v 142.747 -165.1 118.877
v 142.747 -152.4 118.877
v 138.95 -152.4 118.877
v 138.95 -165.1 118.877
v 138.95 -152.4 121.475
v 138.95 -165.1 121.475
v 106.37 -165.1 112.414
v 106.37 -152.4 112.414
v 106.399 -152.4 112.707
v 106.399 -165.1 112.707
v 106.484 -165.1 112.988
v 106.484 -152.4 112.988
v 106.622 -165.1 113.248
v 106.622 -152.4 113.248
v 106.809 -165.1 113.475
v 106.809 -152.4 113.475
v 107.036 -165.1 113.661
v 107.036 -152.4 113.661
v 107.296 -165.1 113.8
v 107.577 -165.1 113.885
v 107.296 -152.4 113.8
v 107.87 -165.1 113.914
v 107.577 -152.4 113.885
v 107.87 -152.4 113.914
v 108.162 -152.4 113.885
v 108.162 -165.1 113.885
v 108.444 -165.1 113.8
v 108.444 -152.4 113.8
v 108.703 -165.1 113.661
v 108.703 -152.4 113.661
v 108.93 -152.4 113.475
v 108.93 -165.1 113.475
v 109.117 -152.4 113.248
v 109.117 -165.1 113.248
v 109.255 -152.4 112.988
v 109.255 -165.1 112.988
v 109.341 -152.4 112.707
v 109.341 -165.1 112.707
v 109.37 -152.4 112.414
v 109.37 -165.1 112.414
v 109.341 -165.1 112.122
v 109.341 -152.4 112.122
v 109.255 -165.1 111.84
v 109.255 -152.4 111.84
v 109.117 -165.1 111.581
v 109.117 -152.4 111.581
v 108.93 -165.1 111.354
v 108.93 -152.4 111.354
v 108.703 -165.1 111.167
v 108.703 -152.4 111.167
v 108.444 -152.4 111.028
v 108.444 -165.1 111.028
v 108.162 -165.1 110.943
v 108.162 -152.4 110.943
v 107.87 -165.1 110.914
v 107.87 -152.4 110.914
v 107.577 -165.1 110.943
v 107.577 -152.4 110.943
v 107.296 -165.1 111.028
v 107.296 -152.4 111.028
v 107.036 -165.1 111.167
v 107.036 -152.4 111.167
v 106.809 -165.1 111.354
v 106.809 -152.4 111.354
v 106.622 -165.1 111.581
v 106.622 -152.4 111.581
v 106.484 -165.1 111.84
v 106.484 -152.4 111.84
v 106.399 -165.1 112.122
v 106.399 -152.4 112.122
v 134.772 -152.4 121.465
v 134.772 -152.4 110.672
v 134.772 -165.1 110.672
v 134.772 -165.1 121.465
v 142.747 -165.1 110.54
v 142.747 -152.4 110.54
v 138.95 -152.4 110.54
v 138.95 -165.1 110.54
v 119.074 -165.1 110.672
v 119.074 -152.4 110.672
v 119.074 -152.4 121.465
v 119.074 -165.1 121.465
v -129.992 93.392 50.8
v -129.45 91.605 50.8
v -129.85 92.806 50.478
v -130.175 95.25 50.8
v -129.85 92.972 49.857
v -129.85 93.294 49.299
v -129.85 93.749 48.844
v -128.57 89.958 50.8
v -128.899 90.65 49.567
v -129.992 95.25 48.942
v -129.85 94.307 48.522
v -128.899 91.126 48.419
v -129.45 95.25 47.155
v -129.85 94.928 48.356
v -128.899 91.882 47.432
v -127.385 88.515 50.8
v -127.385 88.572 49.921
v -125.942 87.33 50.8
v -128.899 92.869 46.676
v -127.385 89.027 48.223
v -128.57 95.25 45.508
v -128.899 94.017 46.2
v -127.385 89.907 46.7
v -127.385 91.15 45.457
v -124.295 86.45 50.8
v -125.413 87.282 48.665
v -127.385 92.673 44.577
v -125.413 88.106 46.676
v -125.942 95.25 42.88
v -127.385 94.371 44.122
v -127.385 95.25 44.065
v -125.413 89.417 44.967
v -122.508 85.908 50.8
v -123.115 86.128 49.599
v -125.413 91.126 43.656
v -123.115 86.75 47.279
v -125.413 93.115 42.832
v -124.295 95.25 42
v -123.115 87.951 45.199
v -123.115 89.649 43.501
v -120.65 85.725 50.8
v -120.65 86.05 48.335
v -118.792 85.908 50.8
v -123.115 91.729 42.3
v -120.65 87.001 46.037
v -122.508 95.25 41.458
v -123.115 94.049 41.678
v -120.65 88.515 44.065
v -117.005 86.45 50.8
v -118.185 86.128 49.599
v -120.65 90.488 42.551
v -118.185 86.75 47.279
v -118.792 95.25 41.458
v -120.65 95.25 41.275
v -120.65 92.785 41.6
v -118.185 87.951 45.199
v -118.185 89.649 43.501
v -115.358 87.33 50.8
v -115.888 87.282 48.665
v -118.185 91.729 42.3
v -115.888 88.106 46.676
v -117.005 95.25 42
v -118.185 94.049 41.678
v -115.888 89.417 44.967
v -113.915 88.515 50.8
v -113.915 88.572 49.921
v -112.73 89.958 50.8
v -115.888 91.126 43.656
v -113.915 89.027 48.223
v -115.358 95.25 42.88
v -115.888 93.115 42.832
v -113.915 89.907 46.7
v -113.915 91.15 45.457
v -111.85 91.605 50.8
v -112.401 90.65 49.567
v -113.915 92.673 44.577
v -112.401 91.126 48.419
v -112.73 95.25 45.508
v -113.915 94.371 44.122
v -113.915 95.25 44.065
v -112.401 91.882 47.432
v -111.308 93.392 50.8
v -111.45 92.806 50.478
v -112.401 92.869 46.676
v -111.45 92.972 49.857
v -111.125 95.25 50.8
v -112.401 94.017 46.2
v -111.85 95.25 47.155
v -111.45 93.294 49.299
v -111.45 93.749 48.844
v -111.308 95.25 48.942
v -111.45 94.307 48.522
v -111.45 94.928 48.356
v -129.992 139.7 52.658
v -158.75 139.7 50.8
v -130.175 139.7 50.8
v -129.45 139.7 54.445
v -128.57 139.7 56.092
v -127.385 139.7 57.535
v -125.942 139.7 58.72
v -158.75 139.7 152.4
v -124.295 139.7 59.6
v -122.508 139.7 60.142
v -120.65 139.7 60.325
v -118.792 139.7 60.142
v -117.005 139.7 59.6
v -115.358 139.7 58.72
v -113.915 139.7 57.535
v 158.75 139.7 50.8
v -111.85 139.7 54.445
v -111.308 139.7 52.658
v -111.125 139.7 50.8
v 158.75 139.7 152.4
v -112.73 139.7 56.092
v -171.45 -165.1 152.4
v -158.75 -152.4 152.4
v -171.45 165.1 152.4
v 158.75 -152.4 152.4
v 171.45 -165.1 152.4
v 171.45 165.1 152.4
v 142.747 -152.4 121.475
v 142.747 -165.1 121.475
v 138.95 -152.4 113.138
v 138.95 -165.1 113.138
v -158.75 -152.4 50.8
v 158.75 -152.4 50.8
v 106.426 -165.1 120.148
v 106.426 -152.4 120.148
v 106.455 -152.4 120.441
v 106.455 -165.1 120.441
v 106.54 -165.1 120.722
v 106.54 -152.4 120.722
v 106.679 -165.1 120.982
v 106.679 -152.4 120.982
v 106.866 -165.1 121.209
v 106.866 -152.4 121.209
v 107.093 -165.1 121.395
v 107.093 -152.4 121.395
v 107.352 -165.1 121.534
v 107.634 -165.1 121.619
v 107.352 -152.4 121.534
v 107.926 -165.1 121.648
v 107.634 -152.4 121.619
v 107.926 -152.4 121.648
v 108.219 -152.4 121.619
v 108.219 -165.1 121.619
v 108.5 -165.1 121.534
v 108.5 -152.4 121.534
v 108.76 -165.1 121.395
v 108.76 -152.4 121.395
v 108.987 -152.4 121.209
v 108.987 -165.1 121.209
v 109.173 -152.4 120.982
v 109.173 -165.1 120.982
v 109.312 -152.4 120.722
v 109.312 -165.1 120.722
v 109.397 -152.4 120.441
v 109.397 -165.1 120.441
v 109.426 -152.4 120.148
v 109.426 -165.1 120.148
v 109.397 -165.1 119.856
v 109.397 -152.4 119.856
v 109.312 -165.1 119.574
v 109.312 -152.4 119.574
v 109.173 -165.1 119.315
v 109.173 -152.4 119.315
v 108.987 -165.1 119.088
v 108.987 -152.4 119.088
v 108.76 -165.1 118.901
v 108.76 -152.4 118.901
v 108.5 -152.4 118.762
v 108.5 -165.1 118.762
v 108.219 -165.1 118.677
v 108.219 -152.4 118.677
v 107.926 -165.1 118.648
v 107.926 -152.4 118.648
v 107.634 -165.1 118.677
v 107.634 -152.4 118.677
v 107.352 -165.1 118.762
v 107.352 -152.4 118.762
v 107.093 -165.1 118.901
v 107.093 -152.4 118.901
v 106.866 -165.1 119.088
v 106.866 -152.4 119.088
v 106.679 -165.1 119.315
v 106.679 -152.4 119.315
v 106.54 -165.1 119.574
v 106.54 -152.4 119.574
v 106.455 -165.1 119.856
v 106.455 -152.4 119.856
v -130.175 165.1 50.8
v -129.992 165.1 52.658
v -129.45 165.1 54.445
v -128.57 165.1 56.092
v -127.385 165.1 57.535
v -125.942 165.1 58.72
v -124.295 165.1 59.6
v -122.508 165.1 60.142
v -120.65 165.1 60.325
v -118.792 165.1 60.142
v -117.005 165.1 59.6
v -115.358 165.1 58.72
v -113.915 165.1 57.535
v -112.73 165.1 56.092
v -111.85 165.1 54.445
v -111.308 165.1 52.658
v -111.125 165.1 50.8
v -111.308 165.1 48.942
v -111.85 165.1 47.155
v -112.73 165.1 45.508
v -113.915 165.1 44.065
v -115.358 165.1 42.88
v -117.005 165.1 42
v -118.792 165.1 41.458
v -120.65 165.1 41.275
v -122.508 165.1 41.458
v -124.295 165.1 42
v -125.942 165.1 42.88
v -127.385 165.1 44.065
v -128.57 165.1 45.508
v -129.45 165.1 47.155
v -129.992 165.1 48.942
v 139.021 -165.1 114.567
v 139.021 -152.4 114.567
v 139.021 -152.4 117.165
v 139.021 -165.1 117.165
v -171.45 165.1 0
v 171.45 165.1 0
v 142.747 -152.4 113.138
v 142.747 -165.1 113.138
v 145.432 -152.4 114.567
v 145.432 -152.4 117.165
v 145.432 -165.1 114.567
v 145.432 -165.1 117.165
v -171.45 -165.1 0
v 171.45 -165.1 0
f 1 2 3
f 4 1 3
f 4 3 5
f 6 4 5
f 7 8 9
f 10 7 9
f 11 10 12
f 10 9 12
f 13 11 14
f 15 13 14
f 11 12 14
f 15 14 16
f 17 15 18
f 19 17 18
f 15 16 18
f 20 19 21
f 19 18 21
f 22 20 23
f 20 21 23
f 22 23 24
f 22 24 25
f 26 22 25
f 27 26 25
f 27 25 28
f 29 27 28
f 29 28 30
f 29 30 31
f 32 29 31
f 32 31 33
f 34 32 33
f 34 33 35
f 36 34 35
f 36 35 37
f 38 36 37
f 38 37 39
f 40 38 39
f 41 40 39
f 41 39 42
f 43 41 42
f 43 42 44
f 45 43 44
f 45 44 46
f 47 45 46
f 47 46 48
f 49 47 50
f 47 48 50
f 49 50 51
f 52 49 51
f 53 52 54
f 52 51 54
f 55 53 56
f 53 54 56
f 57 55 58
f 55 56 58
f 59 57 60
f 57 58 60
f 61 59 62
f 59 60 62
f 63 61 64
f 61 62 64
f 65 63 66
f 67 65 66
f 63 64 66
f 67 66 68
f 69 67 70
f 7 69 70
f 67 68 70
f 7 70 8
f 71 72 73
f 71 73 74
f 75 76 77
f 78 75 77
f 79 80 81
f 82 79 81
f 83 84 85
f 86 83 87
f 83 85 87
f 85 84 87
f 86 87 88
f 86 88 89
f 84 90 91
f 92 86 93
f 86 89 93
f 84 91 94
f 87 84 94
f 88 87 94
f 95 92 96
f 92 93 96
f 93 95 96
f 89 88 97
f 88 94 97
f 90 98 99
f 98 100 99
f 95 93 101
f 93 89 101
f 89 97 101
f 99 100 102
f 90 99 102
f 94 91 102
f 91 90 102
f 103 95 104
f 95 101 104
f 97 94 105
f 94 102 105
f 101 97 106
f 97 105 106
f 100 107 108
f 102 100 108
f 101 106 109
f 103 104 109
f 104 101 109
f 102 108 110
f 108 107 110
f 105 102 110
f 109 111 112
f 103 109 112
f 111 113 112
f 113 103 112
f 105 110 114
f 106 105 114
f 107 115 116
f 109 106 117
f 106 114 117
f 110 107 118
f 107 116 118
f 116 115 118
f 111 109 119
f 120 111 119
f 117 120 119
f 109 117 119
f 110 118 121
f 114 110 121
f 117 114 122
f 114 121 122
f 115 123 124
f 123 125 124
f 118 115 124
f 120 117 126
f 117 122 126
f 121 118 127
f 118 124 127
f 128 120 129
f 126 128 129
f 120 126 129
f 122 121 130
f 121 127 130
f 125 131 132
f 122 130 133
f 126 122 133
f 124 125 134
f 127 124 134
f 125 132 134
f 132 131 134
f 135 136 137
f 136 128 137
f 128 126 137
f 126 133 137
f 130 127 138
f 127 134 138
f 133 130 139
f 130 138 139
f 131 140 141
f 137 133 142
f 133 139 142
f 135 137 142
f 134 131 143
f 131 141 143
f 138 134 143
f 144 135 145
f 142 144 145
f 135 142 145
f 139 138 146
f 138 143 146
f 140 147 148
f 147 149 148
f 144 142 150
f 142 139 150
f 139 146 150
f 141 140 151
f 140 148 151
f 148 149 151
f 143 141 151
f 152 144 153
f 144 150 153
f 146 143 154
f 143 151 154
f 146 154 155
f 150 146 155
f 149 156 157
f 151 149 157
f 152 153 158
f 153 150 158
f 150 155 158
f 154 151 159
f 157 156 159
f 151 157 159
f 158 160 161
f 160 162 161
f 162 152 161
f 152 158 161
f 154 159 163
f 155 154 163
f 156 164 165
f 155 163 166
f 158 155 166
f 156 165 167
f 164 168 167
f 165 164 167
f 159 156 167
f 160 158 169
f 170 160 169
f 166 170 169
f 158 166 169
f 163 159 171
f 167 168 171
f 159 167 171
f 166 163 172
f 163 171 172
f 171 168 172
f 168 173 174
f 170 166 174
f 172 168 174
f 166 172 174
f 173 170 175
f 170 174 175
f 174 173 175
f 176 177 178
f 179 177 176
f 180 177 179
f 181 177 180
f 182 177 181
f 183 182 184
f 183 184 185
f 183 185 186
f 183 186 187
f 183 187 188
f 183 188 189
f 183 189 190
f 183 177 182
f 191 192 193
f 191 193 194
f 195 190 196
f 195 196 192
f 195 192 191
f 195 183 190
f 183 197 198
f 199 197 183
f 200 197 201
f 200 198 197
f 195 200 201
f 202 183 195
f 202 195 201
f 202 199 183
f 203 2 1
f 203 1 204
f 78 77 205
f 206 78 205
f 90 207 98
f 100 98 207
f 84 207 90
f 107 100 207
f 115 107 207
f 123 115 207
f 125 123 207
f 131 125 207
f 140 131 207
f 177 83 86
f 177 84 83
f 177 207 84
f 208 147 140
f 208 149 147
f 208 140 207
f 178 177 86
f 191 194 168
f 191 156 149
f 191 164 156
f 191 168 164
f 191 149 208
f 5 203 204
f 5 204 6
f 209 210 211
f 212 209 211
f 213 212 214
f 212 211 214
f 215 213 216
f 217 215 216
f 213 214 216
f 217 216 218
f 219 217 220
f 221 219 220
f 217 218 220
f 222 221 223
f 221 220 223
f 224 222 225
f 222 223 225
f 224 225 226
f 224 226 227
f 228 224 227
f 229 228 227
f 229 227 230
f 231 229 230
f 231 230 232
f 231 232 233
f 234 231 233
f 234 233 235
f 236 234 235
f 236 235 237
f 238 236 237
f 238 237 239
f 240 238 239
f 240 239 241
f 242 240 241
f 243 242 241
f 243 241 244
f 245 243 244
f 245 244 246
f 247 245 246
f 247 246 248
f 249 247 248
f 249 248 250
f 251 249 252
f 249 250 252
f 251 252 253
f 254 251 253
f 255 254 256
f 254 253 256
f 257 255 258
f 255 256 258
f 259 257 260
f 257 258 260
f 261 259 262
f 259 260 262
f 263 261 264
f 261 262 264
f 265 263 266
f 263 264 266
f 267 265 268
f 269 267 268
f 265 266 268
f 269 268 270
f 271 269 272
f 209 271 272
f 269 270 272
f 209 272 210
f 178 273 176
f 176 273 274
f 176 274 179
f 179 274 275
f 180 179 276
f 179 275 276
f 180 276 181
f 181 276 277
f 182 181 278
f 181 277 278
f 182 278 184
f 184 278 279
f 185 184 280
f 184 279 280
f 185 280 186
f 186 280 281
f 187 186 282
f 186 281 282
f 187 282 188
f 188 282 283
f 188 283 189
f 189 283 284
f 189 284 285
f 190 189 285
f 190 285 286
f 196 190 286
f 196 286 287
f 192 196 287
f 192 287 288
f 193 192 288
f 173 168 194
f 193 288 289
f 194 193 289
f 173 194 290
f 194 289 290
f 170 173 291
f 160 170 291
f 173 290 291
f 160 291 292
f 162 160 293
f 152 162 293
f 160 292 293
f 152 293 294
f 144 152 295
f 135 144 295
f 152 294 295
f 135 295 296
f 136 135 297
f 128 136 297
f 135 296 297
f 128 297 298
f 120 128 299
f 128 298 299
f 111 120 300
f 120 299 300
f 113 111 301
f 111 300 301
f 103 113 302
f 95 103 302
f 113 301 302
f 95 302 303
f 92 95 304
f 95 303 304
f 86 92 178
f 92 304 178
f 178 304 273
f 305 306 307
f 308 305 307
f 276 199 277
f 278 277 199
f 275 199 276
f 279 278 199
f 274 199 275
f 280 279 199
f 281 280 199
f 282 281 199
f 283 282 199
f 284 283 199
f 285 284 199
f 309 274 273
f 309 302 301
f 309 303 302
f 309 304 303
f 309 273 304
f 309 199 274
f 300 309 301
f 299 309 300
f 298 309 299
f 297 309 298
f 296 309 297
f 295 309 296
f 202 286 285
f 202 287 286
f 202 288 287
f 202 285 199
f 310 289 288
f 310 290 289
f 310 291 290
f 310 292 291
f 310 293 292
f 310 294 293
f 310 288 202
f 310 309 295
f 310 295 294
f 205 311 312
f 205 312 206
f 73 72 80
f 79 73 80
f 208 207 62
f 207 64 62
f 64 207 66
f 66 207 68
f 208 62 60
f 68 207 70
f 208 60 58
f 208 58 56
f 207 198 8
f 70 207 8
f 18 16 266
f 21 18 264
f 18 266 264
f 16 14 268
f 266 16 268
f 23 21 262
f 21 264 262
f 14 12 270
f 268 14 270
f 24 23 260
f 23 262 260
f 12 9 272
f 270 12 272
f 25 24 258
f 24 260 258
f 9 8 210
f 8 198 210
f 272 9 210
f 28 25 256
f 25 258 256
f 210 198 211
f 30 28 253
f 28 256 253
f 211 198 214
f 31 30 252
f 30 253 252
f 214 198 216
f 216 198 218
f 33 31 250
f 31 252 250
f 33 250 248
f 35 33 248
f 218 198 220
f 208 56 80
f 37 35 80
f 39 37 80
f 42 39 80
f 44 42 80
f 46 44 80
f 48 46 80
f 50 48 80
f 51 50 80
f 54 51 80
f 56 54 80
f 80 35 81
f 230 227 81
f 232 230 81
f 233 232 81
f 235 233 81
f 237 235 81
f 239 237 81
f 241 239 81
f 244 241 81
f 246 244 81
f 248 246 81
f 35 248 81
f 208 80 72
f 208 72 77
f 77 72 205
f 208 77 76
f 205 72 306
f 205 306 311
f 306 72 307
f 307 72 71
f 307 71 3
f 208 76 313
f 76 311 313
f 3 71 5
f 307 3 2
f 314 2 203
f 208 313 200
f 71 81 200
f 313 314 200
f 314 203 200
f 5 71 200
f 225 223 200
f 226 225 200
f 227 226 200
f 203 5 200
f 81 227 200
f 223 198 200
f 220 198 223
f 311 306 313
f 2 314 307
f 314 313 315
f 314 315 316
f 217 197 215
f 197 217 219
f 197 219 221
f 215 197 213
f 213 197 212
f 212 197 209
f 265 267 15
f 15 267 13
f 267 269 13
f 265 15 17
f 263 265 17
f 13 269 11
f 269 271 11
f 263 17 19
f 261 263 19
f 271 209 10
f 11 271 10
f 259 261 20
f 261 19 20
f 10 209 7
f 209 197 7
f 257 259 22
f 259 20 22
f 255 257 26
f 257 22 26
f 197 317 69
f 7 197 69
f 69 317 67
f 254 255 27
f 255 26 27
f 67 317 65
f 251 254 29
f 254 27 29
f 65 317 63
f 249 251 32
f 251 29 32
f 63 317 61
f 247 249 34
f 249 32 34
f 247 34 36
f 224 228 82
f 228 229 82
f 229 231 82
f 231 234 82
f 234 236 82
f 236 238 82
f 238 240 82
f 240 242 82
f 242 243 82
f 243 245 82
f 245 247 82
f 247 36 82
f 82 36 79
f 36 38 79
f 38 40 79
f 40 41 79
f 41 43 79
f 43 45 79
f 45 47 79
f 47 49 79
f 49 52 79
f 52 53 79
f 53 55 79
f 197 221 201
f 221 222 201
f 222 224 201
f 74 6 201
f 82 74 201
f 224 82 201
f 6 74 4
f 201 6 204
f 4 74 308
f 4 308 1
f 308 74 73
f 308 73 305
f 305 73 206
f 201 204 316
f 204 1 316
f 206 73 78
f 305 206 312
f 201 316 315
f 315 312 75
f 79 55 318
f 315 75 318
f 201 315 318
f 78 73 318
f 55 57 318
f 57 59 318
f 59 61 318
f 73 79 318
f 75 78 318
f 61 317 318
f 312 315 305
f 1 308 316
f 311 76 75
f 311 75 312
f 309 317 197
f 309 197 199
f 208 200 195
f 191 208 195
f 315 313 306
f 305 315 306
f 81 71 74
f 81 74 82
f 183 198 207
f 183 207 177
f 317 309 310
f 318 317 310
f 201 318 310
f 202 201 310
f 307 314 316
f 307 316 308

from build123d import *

# Parameters (mm, degrees)
F0_W     = 342.9
F0_H     = 330.2
F1_DEPTH = 152.4
F2_W     = 317.5
F2_H     = 292.1
F3_DEPTH = 101.6
F4_R     = 9.525
F5_DEPTH = 69.85
F8_R     = 1.499997
F8_W     = 15.6979995019
F8_H     = 10.7923728456
F8_W_2   = 3.7969946861
F8_H_2   = 2.5979578495
F8_W_3   = 6.4112246037
F9_DEPTH = 25.4


with BuildPart() as f1:
    # F0 (on Top) → F1 (new body)
    with BuildSketch(Plane.XY):
        Rectangle(F0_W, F0_H)
    extrude(amount=F1_DEPTH)

    # F2 (on face) → F3 (cut)
    with BuildSketch(Plane.XY.offset(152.4)):
        with Locations((0, -6.35)):
            Rectangle(F2_W, F2_H)
    extrude(amount=-F3_DEPTH, mode=Mode.SUBTRACT)

    # F4 (on face) → F5 (cut, symmetric)
    with BuildSketch(Plane(origin=(0, 165.1, 0), x_dir=(-1, 0, 0), z_dir=(0, 1, 0))):
        with Locations((120.65, 50.8)):
            Circle(F4_R)
    extrude(amount=F5_DEPTH, both=True, mode=Mode.SUBTRACT)

    # F6 (on face) → F7 (revolve, cut)
    with BuildSketch(Plane.XY.offset(50.8)):
        with BuildLine():
            Line((-111.125, 95.25), (-130.175, 95.25))
            ThreePointArc((-130.175, 95.25), (-120.65, 85.725), (-111.125, 95.25))
        make_face()
    revolve(axis=Axis((-120.65, 95.25, 50.8), (1, 0, 0)), mode=Mode.SUBTRACT)

    # F8 (on face) → F9 (cut)
    with BuildSketch(Plane(origin=(0, -152.4, 0), x_dir=(-1, 0, 0), z_dir=(0, 1, 0))):
        with Locations((-107.869675722, 112.4142541665)):
            Circle(F8_R)
        with Locations((-107.9261657216, 120.1482748716)):
            Circle(F8_R)
        with Locations((-126.9230991602, 116.0683184862)):
            Rectangle(F8_W, F8_H)
        with Locations((-140.8484578133, 120.1762259007)):
            Rectangle(F8_W_2, F8_H_2)
        with Locations((-142.2262191772, 115.8662810922)):
            Rectangle(F8_W_3, F8_H_2)
        with Locations((-140.8484429121, 111.8389591575)):
            Rectangle(F8_W_2, F8_H_2)
    extrude(amount=-F9_DEPTH, mode=Mode.SUBTRACT)


solid = f1.part
